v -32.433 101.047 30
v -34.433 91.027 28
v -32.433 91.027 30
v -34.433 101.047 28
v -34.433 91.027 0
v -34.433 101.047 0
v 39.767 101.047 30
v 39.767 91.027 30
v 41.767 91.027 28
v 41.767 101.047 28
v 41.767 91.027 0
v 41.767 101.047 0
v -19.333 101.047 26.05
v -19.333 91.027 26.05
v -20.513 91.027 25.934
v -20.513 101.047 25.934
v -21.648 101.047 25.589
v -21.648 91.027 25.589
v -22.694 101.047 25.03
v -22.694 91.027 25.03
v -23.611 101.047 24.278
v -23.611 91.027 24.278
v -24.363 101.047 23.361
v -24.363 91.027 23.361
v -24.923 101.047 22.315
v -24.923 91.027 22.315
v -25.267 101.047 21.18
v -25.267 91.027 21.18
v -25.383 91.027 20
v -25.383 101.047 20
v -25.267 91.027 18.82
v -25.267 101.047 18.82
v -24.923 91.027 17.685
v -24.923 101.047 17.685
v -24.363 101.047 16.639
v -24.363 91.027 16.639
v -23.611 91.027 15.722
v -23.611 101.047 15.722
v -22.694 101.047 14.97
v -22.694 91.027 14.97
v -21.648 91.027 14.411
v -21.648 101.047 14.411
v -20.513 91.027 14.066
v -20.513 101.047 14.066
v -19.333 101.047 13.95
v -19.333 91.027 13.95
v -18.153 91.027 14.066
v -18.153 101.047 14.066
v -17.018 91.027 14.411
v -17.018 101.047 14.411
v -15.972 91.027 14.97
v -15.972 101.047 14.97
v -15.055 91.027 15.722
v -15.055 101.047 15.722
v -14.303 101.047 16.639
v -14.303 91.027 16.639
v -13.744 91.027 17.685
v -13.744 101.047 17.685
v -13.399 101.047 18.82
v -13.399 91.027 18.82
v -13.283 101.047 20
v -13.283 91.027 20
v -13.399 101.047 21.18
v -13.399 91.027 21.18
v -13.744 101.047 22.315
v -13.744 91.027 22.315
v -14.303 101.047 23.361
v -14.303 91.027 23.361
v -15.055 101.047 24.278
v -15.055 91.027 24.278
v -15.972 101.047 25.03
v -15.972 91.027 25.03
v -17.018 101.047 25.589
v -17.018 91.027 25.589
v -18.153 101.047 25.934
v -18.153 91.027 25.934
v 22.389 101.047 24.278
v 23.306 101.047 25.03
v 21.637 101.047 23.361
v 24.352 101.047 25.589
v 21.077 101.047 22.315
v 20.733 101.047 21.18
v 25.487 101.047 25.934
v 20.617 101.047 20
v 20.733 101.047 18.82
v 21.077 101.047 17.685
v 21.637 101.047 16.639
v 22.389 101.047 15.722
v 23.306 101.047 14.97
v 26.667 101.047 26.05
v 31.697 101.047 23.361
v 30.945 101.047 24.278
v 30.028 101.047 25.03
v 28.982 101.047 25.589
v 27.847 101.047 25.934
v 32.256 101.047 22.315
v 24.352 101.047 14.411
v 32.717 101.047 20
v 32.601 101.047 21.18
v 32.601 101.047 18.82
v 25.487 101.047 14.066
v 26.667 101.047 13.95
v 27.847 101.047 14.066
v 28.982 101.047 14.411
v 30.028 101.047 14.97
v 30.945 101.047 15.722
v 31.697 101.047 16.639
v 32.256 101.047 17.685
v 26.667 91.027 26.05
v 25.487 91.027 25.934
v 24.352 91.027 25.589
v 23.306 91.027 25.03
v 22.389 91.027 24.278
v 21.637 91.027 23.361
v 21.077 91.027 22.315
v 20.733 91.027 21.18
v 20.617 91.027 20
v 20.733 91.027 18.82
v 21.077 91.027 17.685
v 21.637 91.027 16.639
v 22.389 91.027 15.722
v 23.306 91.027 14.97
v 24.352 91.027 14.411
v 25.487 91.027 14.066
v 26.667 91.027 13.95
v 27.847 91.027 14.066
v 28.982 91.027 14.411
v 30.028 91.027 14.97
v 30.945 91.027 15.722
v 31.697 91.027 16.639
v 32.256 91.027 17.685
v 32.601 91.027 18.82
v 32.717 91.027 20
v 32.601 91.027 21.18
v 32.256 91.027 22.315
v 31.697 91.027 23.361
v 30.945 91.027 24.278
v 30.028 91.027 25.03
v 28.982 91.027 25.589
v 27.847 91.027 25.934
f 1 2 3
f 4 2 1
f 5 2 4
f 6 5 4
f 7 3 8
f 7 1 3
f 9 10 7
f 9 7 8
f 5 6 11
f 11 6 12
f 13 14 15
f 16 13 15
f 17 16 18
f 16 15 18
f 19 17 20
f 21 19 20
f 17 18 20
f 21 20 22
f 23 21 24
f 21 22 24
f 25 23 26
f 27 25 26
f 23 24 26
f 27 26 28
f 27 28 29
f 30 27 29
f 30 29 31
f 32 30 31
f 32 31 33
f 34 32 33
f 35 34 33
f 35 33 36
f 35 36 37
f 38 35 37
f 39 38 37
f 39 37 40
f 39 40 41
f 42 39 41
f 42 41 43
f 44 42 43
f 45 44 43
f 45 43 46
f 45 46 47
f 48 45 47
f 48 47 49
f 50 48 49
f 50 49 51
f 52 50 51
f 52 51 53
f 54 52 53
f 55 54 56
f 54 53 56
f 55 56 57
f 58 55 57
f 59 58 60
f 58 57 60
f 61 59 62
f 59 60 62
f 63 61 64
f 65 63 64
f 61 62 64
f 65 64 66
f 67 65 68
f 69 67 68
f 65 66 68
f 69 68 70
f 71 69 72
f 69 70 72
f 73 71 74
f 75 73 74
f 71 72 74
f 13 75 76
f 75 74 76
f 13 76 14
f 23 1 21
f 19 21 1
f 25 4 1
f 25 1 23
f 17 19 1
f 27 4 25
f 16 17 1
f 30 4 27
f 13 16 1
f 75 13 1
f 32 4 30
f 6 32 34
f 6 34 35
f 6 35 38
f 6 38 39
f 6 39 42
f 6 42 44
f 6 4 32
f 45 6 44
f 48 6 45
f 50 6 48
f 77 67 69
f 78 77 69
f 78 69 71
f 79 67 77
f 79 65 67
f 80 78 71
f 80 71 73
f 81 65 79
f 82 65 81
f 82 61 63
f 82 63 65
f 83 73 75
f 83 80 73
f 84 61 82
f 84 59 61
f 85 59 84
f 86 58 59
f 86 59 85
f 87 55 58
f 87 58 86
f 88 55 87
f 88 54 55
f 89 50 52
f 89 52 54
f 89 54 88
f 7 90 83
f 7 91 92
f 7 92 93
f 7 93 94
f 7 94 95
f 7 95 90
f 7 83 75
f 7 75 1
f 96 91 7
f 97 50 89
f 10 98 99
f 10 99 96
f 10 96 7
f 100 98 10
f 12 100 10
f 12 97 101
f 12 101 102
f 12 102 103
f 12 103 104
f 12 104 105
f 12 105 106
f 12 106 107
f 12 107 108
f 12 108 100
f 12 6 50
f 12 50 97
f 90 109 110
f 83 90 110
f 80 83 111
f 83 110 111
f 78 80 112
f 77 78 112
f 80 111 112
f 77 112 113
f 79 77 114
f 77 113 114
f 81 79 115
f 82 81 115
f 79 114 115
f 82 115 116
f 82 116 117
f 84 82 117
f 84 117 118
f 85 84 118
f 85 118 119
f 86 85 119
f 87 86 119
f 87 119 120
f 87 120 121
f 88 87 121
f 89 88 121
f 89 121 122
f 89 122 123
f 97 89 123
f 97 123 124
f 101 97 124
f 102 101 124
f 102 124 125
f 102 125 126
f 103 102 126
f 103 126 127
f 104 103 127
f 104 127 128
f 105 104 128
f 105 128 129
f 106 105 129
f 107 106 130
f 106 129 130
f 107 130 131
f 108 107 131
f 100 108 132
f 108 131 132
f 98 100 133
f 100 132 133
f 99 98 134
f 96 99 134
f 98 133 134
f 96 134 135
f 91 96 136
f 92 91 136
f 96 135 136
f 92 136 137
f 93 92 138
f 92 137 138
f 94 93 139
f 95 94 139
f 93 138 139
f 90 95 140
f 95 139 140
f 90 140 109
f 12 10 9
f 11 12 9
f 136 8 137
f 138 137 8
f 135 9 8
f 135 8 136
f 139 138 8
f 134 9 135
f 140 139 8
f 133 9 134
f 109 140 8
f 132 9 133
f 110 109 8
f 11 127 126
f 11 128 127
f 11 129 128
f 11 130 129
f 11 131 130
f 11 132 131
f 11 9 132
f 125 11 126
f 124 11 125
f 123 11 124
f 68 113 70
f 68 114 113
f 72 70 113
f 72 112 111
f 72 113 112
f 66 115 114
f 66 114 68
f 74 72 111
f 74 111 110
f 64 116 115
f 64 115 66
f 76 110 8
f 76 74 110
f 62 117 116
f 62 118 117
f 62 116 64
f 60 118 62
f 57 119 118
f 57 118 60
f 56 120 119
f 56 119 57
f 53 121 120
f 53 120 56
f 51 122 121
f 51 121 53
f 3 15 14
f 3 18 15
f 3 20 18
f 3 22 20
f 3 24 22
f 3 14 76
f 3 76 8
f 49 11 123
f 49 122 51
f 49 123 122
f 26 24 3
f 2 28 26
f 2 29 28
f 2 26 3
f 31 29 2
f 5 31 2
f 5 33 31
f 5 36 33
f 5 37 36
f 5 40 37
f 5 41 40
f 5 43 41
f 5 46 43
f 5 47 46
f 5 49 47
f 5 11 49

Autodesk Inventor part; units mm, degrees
ref_plane "YZ Plane" through (0, 0, 0) normal (1, 0, 0) x (0, 1, 0)
ref_plane "XZ Plane" through (0, 0, 0) normal (0, 1, 0) x (-1, 0, 0)
ref_plane "XY Plane" through (0, 0, 0) normal (0, 0, 1) x (1, 0, 0)
sketch "Esboço1" plane through (0, 0, 0) normal (0, 0, 1) x (1, 0, 0)
  line L0 (-34.4331, 101.047) -> (41.7669, 101.047)
  line L1 (41.7669, 101.047) -> (41.7669, 91.027)
  line L2 (41.7669, 91.027) -> (-34.4331, 91.027)
  line L3 (-34.4331, 91.027) -> (-34.4331, 101.047)
  point P0 (0, 0)
  dimension "d0" = 76.2
  dimension "d1" = 10.02
extrude "Extrusão1" add sketch "Esboço1" along normal blind 30
sketch "Esboço2" plane through (-34.4331, 101.047, 0) normal (0, 1, 0) x (1, 0, 0)
  line L0 (76.2, 0) -> (76.2, -30) projected
  line L1 (76.2, -20) -> (0, -20)
  line L2 (0, 0) -> (0, -30) projected
  line L3 (0, 0) -> (76.2, 0) projected
  line L4 (38.1, -40) -> (38.1, 0)
  circle A0 centre (61.1, -20) radius 6.7139
  circle A1 centre (15.1, -20) radius 6.7459
  point P0 (34.4331, 0)
  dimension "d4" = 20
  dimension "d5" = 23
  dimension "d6" = 23
hole "Furo1" at (26.6669, 101.047, 20) at (-19.3331, 101.047, 20) direction (0, -1, 0) diameter 12.1 end through all
chamfer "Chanfro1" distance 2 angle 45 1 edges at (41.7669, 96.037, 30)
chamfer "Chanfro2" distance 2 angle 45 1 edges at (-34.4331, 96.037, 30)
equation "\"d6\" = d5"
equation "\"d12\" = 0.5 * d1"
properties part number "SuporteGuiasCabeçasAquecimentoUsinagem"
